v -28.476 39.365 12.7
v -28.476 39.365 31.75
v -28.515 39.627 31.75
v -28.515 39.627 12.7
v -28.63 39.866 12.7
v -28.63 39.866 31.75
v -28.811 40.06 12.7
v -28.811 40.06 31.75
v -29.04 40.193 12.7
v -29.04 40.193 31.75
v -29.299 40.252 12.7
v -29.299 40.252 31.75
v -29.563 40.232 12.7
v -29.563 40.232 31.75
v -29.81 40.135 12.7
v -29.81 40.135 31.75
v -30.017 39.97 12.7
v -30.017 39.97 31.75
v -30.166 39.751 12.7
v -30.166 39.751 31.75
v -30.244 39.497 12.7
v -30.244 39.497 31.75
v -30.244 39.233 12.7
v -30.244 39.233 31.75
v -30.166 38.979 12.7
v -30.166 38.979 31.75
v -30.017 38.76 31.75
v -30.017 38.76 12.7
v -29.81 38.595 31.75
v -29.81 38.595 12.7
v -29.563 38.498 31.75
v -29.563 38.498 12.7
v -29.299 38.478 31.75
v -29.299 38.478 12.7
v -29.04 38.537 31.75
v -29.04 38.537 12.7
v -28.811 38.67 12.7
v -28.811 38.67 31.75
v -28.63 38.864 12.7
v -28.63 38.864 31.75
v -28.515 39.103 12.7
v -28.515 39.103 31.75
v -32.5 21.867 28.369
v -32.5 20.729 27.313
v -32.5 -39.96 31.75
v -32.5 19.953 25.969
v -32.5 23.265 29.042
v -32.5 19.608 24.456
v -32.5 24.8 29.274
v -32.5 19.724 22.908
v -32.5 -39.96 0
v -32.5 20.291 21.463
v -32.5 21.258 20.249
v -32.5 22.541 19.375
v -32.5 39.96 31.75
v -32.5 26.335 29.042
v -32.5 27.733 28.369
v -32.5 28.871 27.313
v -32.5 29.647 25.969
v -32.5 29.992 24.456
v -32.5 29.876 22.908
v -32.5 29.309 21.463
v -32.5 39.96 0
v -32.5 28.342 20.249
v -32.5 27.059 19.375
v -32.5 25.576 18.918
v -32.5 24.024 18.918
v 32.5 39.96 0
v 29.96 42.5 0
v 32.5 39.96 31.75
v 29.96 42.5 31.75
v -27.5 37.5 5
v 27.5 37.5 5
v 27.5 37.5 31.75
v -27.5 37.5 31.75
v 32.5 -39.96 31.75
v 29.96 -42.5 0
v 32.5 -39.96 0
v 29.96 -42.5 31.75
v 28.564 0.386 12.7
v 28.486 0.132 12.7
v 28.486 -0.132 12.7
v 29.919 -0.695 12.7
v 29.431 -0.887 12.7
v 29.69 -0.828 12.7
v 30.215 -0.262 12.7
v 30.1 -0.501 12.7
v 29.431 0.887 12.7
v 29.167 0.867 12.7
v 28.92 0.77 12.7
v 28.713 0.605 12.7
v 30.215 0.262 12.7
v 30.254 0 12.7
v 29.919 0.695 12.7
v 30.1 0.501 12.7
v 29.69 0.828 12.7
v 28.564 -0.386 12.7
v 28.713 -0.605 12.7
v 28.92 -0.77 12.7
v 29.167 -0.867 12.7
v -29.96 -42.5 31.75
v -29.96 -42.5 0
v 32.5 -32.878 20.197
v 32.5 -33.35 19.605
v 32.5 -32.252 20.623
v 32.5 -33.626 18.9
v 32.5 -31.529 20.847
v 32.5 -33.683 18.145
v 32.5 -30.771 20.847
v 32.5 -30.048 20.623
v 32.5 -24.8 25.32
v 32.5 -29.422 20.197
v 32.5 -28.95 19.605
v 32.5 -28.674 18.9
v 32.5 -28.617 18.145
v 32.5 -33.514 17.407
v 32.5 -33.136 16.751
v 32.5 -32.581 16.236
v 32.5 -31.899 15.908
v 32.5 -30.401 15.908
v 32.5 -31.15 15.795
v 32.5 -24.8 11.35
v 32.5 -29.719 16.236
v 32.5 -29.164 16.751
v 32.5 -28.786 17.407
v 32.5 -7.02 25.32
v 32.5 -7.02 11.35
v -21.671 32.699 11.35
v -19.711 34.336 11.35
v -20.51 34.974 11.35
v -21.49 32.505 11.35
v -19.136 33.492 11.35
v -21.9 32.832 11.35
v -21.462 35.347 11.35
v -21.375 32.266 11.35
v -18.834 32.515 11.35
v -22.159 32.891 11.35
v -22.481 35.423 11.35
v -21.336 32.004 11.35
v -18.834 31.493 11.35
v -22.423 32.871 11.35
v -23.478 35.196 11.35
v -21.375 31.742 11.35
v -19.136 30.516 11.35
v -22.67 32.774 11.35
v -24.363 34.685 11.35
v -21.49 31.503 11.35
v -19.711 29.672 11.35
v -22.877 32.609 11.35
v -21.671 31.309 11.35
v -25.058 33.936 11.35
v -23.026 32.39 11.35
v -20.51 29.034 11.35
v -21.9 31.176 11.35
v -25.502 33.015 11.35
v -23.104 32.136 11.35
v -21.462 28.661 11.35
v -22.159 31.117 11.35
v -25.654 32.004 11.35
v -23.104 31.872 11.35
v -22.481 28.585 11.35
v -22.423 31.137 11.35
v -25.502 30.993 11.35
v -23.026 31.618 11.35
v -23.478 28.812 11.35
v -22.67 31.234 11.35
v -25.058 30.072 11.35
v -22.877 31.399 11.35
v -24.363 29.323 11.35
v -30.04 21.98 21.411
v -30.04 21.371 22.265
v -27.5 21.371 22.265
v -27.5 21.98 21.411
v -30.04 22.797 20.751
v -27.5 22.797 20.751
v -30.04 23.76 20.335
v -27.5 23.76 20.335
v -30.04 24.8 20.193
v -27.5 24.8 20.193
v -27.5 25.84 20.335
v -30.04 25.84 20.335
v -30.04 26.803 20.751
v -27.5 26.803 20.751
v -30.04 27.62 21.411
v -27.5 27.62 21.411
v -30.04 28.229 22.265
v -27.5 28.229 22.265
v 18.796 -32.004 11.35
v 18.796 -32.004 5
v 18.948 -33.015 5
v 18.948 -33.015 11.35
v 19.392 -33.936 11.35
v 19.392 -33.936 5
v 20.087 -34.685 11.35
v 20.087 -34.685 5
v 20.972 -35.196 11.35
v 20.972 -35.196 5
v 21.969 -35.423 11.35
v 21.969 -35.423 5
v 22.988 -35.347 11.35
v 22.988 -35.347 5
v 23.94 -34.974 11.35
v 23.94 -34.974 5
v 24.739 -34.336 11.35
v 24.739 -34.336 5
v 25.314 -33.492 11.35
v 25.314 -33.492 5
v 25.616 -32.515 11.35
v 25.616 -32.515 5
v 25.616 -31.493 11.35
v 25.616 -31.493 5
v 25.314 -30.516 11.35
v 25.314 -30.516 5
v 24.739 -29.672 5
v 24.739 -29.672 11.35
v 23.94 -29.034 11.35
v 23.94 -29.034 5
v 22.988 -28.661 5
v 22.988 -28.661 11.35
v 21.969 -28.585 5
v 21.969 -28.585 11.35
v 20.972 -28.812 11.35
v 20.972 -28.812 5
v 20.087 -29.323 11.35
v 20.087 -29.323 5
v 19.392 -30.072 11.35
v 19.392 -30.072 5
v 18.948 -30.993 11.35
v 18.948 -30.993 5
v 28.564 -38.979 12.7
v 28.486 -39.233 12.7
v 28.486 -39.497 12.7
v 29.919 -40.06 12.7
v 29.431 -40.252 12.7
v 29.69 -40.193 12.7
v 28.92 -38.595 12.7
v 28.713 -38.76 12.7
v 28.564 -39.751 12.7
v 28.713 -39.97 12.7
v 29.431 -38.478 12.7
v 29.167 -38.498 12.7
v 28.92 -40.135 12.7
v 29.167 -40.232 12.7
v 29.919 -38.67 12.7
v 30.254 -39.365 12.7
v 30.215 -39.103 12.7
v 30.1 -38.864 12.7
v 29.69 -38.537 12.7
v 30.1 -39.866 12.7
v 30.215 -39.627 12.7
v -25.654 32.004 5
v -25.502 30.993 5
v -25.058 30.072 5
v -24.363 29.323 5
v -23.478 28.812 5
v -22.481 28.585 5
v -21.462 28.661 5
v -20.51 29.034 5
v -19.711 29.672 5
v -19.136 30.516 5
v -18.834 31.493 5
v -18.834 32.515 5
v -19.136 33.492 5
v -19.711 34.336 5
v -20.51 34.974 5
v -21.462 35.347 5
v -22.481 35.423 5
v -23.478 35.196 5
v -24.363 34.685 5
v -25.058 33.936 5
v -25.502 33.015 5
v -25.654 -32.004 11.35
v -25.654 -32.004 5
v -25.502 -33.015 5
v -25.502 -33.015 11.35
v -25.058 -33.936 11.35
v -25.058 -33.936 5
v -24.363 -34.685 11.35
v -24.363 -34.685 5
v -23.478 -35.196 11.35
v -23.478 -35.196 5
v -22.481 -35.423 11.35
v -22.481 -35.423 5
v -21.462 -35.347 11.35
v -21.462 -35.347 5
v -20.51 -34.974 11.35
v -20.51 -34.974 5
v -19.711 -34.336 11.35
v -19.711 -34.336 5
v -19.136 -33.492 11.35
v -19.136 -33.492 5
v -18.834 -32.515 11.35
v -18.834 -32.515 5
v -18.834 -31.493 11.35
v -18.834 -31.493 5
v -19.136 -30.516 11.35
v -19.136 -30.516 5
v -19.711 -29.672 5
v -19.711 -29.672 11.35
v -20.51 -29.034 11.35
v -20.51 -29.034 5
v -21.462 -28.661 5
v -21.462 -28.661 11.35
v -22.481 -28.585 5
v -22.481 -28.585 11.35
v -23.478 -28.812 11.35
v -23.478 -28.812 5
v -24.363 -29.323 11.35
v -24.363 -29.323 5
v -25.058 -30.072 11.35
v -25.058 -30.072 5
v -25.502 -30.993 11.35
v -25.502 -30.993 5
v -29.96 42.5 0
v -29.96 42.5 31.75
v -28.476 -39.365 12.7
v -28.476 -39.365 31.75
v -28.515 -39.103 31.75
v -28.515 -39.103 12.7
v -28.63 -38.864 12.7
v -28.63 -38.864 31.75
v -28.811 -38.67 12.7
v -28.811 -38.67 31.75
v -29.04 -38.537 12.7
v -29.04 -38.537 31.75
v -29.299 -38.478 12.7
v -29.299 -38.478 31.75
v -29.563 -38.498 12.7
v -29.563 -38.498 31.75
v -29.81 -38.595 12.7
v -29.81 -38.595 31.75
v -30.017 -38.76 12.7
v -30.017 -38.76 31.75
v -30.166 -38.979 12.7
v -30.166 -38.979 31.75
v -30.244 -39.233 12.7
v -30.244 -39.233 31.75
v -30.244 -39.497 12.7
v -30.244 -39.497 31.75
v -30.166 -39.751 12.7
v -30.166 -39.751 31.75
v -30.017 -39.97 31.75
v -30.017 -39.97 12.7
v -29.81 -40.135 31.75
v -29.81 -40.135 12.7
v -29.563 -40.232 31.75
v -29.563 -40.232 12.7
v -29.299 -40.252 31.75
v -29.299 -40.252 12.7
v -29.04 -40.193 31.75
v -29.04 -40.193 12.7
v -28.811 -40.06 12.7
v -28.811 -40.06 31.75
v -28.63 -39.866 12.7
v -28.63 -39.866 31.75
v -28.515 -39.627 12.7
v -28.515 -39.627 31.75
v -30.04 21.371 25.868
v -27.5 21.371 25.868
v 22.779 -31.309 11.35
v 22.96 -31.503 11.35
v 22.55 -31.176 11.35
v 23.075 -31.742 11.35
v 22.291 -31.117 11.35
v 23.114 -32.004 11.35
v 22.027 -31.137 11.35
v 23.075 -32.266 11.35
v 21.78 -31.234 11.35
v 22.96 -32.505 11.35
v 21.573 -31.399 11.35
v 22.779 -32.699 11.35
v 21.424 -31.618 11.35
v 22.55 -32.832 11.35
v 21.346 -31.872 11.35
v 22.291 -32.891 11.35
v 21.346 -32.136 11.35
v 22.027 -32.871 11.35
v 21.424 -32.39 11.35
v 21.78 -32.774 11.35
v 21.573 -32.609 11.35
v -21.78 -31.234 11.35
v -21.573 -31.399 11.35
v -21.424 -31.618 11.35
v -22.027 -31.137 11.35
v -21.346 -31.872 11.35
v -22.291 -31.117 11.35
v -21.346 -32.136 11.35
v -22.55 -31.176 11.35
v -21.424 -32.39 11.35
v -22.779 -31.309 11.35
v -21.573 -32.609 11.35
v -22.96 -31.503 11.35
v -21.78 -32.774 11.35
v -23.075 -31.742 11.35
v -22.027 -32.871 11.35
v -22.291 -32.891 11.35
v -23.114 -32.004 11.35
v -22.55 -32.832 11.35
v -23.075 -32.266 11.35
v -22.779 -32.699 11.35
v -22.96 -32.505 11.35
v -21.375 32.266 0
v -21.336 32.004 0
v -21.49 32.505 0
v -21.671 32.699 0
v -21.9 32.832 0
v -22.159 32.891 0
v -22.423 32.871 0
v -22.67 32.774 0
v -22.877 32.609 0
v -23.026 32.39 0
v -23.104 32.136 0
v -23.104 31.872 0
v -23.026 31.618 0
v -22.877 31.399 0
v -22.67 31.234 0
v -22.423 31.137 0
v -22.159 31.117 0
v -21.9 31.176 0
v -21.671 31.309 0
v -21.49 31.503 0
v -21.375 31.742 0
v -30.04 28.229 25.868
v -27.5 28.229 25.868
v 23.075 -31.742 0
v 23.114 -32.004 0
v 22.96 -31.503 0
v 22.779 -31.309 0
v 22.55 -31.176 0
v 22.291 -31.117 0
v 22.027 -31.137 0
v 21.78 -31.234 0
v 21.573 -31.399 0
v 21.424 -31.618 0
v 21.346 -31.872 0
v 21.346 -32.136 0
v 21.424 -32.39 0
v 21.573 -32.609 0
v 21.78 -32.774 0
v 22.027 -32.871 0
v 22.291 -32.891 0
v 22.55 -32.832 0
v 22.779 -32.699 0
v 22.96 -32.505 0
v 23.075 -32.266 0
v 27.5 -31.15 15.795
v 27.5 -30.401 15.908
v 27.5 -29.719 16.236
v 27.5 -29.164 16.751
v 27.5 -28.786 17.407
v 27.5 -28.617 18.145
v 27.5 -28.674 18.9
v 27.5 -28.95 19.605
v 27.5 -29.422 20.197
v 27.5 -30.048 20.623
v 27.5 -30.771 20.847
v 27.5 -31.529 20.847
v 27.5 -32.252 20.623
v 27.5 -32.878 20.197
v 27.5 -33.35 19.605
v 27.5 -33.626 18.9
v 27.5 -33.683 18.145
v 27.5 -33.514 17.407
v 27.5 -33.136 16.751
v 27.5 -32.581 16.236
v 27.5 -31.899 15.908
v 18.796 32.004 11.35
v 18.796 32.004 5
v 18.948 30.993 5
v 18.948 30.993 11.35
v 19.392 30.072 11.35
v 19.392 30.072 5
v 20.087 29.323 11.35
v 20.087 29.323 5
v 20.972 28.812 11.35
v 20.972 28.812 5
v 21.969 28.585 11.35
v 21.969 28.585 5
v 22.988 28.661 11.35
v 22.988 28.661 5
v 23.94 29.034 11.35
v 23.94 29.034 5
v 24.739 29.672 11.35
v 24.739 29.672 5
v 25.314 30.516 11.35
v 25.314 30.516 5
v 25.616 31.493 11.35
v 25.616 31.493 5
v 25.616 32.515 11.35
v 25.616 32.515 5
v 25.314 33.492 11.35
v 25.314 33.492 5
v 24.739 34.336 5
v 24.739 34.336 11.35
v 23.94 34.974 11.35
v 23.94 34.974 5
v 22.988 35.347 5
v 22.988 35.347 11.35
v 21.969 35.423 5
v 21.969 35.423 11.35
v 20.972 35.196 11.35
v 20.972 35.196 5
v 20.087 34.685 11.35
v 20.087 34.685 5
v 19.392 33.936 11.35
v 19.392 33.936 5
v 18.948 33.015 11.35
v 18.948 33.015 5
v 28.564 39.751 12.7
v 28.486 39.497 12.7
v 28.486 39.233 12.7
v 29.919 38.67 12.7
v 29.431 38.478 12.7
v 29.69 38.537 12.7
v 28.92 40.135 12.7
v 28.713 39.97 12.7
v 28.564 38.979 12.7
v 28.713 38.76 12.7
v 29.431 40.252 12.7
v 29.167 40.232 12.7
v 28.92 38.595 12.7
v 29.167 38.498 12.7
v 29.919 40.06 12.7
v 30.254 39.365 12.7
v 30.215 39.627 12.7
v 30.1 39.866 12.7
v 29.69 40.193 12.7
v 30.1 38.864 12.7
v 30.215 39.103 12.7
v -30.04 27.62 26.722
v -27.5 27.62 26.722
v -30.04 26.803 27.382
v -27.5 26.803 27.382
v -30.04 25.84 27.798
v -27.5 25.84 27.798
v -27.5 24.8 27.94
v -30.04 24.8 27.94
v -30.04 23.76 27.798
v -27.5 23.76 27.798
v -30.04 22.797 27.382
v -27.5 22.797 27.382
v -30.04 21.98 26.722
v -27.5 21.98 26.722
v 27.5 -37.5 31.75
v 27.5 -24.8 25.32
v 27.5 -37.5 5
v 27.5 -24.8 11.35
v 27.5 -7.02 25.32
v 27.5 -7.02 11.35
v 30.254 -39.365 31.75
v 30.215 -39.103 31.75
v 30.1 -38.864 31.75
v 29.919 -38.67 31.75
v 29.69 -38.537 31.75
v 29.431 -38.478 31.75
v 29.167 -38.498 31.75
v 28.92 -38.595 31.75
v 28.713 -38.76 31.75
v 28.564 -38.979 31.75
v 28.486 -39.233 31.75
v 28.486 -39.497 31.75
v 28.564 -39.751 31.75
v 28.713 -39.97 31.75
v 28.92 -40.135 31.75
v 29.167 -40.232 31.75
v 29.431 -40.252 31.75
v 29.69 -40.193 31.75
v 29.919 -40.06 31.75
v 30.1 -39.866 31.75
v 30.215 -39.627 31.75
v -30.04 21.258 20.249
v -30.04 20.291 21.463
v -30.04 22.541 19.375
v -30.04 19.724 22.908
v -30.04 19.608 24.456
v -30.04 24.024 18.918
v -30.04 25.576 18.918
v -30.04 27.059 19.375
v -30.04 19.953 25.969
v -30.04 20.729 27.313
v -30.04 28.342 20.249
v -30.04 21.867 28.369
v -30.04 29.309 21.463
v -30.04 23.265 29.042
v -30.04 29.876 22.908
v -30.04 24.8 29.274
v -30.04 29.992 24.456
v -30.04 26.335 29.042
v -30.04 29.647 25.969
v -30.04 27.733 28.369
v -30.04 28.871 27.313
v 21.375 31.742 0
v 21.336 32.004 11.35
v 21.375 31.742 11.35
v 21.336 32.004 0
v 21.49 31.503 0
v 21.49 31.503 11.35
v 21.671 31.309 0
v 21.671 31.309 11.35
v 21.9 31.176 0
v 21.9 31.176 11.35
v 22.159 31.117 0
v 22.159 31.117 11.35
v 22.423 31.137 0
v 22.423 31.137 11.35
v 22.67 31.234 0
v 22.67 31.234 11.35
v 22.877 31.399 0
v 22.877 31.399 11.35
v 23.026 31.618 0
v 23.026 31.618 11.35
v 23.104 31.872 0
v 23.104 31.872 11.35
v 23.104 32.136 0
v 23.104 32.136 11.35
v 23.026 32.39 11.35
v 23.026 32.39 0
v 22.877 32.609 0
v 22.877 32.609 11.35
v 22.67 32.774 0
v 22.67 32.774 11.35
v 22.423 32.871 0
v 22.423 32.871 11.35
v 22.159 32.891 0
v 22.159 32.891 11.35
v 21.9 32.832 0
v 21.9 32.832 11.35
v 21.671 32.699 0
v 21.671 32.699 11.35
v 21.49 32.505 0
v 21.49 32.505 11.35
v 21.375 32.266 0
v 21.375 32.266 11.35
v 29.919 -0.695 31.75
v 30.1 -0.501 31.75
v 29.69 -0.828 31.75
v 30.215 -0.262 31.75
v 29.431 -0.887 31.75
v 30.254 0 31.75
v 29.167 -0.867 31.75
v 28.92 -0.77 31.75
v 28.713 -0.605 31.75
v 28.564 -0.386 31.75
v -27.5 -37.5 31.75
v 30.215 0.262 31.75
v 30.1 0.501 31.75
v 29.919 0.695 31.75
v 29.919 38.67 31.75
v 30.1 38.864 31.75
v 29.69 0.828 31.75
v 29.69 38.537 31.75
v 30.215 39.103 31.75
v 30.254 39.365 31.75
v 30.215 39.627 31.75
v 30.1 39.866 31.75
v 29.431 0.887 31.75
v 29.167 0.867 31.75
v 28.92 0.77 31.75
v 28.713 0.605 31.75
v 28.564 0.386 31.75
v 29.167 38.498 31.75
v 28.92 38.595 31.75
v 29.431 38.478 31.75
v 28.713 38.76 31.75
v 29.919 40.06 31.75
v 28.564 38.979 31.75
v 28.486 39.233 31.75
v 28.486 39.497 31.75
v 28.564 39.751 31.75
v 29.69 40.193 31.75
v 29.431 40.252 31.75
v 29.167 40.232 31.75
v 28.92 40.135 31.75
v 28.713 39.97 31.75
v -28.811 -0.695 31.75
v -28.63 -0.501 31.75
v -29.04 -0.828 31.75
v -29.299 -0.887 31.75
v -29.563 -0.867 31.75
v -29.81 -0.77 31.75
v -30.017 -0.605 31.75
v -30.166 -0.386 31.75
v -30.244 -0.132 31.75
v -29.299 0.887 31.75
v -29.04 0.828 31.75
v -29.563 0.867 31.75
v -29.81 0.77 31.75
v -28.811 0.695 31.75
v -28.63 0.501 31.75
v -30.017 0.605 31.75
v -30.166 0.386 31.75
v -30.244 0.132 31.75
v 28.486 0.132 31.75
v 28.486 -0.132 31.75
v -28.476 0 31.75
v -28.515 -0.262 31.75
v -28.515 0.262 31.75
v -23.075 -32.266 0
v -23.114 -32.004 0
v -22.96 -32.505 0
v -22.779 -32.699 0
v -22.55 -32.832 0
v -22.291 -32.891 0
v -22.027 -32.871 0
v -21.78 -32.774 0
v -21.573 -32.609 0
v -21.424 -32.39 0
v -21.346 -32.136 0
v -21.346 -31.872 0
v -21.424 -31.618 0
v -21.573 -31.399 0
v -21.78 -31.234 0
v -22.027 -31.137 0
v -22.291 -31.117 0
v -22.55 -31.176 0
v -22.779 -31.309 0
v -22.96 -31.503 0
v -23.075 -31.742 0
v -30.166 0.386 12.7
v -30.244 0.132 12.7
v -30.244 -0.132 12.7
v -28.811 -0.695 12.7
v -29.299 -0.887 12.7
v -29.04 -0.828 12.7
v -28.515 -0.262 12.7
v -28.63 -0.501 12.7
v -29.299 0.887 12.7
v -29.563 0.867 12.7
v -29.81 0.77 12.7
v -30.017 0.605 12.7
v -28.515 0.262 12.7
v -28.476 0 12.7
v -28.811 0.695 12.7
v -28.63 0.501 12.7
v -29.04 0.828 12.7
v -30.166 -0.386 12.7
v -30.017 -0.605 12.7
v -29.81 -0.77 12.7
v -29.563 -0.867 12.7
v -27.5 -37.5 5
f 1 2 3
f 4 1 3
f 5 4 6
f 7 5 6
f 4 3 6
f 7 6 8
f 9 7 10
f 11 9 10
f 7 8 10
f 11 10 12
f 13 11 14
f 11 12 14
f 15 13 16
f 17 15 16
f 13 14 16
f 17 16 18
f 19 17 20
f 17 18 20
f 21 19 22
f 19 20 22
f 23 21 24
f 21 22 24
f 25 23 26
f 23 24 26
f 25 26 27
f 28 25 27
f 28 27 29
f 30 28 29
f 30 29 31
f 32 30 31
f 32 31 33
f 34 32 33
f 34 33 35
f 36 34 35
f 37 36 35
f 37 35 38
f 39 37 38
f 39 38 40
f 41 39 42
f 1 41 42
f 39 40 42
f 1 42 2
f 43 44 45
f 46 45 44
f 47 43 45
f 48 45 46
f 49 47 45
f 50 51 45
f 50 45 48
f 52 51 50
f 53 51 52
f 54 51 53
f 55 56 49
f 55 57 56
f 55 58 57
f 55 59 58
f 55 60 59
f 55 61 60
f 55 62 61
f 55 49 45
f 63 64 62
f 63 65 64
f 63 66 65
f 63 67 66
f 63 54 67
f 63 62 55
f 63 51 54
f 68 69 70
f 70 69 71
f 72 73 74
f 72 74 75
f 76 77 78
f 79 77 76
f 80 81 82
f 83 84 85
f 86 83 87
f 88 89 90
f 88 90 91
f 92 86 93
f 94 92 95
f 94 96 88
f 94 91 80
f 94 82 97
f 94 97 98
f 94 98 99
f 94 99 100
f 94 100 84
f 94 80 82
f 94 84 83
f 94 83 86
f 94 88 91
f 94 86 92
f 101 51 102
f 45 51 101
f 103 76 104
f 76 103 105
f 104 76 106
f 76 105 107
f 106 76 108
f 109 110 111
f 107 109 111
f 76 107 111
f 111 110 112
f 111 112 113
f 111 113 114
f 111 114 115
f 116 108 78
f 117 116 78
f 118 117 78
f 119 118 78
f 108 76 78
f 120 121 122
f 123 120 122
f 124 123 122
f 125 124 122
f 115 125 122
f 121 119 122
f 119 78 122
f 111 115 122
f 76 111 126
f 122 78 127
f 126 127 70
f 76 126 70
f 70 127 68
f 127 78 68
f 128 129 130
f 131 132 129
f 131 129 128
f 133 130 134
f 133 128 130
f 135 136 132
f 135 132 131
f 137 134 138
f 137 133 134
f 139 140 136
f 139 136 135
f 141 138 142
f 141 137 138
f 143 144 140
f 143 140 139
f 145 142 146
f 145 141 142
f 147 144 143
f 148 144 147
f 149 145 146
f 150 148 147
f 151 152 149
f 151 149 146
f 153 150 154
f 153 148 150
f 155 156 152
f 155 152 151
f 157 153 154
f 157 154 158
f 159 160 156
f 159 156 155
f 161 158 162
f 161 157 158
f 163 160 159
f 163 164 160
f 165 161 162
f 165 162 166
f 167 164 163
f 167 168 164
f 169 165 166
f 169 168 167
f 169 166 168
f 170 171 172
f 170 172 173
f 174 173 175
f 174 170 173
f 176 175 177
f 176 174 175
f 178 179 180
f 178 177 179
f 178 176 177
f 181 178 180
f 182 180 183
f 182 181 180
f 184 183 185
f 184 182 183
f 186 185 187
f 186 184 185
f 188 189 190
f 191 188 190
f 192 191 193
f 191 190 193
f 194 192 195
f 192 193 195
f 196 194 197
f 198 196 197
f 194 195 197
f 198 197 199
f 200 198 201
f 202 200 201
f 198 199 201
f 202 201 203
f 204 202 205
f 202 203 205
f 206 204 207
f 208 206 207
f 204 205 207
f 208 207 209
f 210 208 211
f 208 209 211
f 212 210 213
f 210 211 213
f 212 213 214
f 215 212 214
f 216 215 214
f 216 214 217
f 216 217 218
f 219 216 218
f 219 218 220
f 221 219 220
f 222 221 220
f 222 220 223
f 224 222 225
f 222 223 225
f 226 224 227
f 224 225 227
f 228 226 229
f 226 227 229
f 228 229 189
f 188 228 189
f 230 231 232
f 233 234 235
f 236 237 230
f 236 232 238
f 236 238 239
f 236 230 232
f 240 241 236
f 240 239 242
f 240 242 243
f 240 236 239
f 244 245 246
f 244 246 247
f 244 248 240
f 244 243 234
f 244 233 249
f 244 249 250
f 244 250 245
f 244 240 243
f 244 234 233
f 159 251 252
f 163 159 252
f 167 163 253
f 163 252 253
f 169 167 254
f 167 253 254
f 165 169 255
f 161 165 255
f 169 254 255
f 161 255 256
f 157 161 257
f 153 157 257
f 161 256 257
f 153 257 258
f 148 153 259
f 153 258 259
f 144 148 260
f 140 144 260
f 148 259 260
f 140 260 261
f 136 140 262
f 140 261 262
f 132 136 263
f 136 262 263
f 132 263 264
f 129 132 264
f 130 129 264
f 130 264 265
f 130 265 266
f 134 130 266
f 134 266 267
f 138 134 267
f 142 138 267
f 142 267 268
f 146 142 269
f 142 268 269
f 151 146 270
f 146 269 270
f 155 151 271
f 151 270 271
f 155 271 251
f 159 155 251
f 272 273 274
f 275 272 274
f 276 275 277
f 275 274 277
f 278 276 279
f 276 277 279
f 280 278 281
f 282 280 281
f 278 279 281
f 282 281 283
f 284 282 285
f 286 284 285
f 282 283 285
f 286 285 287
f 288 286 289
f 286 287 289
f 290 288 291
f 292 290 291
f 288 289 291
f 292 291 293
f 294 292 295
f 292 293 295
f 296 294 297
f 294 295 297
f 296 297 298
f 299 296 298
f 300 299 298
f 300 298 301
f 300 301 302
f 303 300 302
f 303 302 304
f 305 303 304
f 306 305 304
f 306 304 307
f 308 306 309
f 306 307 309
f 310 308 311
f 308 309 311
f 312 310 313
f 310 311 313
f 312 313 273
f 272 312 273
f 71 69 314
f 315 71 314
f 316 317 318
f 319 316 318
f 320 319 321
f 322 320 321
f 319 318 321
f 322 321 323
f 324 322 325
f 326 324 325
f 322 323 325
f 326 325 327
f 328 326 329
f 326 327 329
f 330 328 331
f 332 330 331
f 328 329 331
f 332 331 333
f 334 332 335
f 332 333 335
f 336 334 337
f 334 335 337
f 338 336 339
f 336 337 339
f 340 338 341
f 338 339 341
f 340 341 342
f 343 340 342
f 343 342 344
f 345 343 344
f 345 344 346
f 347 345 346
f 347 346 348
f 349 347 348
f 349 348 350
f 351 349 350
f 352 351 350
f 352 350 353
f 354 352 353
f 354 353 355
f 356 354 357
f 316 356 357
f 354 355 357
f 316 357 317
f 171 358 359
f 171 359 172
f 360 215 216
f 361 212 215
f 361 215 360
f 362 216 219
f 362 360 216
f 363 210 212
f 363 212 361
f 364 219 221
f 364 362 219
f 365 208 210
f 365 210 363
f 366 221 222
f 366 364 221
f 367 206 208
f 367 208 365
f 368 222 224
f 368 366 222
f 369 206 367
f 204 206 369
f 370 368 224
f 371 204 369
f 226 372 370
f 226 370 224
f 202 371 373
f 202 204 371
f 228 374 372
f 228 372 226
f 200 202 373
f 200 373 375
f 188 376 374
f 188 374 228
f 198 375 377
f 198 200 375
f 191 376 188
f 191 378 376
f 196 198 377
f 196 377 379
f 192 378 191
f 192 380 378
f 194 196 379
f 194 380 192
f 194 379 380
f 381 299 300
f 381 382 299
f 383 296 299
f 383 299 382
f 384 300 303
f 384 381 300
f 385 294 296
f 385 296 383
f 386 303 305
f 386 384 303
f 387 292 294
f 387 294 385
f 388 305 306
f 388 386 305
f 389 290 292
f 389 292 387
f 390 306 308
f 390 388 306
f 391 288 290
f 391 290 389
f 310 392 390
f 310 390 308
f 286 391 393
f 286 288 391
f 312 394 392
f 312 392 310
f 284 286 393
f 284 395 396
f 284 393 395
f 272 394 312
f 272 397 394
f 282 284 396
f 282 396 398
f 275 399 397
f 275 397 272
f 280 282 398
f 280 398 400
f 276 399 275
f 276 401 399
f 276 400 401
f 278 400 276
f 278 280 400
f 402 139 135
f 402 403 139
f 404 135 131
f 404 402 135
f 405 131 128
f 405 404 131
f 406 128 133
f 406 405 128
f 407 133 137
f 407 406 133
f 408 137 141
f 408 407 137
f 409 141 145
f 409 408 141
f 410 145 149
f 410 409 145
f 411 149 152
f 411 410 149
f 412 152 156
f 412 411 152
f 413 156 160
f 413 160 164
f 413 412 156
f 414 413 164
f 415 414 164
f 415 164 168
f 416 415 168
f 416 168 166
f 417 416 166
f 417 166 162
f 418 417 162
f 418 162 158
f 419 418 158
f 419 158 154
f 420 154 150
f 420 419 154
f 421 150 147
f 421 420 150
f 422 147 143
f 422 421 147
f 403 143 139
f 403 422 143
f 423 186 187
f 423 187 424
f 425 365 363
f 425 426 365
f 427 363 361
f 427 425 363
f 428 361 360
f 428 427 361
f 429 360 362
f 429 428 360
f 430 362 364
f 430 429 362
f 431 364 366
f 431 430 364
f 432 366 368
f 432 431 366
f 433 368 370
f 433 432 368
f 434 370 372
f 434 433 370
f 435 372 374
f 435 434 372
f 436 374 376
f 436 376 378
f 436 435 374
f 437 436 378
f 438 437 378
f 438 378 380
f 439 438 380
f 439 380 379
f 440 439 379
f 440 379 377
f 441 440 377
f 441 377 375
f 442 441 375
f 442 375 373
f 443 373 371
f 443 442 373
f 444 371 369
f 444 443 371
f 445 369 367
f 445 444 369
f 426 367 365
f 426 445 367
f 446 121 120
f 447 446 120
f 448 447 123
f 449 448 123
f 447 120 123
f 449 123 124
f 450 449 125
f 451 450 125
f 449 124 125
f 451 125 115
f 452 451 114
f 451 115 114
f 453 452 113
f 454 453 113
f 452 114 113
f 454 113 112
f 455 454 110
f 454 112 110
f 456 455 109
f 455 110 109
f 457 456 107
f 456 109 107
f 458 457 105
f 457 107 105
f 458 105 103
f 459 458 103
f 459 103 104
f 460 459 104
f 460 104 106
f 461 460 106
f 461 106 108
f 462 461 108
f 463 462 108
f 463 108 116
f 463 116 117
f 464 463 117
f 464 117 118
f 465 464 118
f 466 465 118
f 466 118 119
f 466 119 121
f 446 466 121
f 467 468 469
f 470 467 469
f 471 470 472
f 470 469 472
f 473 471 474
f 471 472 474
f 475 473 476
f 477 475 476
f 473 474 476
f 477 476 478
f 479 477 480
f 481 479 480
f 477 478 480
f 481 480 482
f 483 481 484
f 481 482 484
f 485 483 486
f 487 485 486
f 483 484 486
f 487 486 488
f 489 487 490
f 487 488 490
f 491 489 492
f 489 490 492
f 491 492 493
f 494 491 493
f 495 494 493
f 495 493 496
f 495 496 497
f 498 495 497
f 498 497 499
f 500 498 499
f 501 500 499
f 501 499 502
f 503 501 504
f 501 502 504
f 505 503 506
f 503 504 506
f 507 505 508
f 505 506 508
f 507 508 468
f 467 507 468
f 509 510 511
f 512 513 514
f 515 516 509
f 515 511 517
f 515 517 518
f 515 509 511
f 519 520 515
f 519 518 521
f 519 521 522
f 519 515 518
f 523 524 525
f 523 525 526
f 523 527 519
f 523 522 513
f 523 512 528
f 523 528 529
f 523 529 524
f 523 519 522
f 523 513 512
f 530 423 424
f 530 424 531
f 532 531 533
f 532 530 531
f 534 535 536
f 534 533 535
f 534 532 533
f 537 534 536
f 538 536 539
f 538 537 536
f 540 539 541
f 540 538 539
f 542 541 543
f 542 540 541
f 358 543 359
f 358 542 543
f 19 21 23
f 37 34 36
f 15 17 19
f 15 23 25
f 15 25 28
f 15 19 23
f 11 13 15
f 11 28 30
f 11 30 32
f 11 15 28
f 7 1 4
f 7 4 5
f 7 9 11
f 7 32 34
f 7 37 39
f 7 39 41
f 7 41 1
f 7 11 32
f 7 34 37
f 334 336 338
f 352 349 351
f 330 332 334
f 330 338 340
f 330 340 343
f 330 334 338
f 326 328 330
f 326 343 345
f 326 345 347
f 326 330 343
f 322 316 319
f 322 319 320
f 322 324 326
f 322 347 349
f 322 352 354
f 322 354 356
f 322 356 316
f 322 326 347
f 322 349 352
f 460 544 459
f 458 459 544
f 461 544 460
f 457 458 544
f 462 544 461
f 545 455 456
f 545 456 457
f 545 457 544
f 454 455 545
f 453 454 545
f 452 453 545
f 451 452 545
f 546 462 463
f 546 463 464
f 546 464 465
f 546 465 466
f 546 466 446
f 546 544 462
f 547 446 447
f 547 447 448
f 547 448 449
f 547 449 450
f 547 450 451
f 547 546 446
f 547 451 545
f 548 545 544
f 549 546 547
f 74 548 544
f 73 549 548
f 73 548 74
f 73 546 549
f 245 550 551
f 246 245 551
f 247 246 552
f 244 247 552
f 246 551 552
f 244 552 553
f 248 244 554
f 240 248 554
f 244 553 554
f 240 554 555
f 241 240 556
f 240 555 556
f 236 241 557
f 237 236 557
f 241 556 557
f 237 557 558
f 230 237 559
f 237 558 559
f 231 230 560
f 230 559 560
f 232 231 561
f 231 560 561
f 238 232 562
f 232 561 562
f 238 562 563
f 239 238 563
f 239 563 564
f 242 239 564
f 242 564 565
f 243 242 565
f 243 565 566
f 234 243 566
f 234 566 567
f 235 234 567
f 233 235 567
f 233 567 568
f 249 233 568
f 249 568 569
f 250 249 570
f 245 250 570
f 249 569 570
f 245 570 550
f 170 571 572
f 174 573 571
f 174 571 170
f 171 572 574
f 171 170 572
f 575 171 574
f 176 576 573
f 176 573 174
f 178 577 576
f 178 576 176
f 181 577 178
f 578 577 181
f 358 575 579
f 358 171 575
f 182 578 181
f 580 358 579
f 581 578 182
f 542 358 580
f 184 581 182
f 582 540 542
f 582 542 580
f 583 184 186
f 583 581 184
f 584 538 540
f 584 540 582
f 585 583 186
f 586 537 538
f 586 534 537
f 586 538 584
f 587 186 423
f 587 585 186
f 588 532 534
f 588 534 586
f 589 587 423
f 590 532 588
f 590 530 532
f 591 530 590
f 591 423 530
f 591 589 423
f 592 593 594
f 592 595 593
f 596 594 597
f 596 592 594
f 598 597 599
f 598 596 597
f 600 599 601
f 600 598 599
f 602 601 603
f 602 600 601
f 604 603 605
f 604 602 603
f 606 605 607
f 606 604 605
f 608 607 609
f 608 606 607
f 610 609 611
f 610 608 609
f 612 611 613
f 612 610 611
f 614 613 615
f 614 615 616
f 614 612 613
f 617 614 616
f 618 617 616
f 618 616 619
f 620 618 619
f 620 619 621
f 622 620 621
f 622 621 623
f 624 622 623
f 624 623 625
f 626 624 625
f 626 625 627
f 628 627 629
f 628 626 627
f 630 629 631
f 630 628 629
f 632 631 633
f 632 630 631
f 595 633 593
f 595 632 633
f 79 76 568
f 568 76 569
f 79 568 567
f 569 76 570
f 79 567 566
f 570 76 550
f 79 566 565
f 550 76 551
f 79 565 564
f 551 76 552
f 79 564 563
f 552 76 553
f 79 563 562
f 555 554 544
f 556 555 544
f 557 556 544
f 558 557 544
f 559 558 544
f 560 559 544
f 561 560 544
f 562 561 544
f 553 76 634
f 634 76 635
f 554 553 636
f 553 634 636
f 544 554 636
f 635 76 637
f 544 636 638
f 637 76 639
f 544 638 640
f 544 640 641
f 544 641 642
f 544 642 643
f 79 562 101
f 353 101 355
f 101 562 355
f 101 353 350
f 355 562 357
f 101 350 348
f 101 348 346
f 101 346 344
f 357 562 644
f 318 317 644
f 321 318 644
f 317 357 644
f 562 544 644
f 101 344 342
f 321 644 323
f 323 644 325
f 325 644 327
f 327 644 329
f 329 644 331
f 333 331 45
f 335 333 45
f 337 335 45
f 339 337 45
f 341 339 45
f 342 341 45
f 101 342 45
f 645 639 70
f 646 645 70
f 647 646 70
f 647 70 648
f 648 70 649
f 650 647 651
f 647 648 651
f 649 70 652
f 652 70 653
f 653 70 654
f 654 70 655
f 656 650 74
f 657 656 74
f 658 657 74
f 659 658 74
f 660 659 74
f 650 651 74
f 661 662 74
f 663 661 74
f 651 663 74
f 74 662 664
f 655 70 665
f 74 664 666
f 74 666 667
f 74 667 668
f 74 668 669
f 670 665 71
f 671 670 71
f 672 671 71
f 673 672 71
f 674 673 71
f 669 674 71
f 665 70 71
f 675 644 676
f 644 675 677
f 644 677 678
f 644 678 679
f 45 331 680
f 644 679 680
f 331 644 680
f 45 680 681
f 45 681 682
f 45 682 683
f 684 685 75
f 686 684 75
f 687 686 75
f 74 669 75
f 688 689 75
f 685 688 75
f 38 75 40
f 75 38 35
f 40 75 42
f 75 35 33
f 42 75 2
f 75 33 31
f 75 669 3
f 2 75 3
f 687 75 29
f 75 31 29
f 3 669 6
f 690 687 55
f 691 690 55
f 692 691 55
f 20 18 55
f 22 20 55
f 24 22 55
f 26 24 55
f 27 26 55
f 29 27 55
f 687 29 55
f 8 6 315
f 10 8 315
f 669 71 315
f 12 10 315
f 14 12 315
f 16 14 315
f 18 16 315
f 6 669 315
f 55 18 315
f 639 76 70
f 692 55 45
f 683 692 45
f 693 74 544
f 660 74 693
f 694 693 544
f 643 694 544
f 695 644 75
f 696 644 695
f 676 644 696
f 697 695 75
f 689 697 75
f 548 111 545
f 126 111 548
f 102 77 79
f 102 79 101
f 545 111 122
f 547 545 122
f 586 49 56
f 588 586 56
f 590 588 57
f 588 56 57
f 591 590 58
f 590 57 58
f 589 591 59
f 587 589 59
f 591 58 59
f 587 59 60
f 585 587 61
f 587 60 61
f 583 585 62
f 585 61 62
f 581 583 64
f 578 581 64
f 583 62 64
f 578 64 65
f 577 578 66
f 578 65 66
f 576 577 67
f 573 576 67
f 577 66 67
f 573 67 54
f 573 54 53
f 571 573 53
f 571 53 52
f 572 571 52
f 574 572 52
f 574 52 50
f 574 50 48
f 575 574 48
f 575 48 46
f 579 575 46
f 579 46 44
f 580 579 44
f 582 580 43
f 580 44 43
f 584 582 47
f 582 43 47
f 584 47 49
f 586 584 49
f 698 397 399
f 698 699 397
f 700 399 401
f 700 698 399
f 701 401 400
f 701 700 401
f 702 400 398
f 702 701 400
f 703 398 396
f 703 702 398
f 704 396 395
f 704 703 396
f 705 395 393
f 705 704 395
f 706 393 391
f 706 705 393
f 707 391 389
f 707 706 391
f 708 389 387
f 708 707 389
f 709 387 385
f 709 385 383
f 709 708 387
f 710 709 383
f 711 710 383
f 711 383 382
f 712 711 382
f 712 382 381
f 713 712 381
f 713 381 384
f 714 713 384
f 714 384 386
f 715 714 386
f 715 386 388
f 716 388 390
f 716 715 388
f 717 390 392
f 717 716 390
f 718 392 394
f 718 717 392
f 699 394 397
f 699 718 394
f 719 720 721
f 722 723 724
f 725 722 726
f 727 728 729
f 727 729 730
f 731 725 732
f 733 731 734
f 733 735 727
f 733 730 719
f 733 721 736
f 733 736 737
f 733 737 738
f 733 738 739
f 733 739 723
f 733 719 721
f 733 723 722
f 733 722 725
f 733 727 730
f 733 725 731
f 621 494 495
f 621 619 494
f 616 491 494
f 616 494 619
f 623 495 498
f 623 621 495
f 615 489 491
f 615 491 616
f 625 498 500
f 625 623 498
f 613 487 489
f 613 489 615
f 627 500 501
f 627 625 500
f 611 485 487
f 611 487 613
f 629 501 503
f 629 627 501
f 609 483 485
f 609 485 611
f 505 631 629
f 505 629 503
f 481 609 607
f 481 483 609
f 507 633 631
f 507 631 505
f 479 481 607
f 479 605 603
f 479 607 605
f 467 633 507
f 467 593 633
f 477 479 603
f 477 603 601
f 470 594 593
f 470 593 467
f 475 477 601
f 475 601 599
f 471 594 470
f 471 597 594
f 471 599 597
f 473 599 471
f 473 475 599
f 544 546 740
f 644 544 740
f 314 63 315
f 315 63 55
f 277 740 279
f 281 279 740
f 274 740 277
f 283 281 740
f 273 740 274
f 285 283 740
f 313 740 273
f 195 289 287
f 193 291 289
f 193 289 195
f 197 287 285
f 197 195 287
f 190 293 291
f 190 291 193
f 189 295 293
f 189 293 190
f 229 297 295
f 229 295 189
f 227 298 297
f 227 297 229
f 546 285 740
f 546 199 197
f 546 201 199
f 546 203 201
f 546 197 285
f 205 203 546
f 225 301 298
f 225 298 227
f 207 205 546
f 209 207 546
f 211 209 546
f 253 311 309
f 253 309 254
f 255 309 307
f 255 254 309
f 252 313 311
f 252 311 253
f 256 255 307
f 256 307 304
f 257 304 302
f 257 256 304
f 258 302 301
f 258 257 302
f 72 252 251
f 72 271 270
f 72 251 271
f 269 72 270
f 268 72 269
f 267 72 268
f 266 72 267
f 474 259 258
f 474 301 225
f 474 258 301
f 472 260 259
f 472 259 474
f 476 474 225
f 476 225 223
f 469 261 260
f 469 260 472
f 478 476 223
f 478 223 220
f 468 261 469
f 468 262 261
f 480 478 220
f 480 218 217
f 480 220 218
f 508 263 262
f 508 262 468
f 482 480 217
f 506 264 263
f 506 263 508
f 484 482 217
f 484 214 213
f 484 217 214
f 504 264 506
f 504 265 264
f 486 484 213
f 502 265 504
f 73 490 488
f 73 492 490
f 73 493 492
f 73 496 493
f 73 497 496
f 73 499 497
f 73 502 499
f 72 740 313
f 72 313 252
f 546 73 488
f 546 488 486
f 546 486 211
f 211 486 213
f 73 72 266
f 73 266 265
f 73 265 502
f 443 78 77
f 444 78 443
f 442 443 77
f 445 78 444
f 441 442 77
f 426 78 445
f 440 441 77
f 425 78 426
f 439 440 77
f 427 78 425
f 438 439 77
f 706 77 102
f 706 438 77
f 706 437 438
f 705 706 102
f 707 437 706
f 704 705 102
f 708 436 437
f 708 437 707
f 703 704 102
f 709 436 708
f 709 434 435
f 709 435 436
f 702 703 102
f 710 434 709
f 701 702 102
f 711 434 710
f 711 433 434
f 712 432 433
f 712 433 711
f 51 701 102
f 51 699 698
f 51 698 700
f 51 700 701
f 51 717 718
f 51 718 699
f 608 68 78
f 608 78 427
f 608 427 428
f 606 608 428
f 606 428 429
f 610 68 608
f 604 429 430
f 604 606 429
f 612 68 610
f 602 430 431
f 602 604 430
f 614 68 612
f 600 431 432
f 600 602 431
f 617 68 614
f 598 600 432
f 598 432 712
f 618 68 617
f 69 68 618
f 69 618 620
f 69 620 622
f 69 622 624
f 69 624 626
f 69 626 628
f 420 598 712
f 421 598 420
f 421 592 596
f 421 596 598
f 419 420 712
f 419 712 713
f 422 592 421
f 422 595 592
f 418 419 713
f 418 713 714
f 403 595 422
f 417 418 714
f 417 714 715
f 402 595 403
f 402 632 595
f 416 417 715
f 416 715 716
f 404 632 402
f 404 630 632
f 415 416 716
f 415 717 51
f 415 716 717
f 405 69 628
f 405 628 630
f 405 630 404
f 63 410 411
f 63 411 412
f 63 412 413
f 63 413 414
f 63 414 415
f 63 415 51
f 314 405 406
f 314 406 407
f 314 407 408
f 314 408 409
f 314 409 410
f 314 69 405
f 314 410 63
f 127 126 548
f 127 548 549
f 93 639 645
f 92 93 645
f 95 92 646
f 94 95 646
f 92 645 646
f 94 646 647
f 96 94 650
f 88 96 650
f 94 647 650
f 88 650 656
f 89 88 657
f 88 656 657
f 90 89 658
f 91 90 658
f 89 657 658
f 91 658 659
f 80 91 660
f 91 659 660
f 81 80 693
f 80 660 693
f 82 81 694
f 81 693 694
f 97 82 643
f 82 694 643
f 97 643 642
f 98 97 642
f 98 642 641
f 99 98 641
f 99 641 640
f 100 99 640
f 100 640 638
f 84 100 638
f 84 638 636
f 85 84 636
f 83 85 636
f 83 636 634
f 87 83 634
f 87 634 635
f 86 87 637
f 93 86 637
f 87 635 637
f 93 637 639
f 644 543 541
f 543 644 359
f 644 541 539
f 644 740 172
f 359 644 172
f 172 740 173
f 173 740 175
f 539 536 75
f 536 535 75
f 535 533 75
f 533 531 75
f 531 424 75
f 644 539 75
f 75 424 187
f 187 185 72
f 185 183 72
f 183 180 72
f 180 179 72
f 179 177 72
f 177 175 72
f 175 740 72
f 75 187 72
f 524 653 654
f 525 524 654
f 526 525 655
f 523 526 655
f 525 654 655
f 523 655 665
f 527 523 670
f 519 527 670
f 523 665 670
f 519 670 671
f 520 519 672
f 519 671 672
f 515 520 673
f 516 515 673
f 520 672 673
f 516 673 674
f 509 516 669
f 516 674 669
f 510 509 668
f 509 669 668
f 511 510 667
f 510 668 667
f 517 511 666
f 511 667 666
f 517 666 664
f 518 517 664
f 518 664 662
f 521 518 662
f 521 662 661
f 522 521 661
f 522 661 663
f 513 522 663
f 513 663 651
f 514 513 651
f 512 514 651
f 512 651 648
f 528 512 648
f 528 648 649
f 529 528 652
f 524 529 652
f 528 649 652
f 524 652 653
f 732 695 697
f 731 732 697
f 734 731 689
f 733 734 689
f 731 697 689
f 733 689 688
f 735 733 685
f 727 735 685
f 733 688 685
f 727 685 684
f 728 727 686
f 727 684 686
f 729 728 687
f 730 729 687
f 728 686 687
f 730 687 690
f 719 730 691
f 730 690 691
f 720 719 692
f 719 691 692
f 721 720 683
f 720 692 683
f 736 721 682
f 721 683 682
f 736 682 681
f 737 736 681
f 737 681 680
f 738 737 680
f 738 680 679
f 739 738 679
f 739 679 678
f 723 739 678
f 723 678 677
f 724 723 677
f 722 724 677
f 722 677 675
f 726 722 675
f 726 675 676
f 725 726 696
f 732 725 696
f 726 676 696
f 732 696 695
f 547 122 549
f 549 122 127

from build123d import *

# Parameters (mm, degrees)
SKETCH1_W           = 55
SKETCH1_H           = 75
SKETCH1_R           = 0.889
BOSS_EXTRUDE1_DEPTH = 5
SKETCH2_W           = 65
SKETCH2_H           = 85
SKETCH2_W_2         = 55
SKETCH2_H_2         = 75
BOSS_EXTRUDE2_DEPTH = 31.75
CUT_EXTRUDE1_REACH  = 85.901
SKETCH4_R           = 5.207
CUT_EXTRUDE2_DEPTH  = 2.46
CHAMFER1_SIZE       = 2.54
SKETCH5_R           = 0.889
CUT_EXTRUDE3_DEPTH  = 19.05
SKETCH6_R           = 3.429
SKETCH6_R_2         = 0.889
BOSS_EXTRUDE3_DEPTH = 6.35
CUT_EXTRUDE4_REACH  = 85.901
SKETCH7_W           = 13.97
SKETCH7_H           = 17.78
CUT_EXTRUDE5_REACH  = 85.901
SKETCH8_R           = 2.54


with BuildPart() as part:
    # Sketch1 → Boss-Extrude1 (new body)
    with BuildSketch(Plane.XY):
        Rectangle(SKETCH1_W, SKETCH1_H)
        with Locations((-22.225, 32.004)):
            Circle(SKETCH1_R, mode=Mode.SUBTRACT)
        with Locations(Location((-22.225, -32.004, 0), (0, 0, 180))):
            Circle(SKETCH1_R, mode=Mode.SUBTRACT)
        with Locations((22.225, -32.004)):
            Circle(SKETCH1_R, mode=Mode.SUBTRACT)
        with Locations(Location((22.225, 32.004, 0), (0, 0, 180))):
            Circle(SKETCH1_R, mode=Mode.SUBTRACT)
    extrude(amount=BOSS_EXTRUDE1_DEPTH)

    # Sketch2 → Boss-Extrude2 (add)
    with BuildSketch(Plane(origin=(0, 0, 0), x_dir=(-1, 0, 0), z_dir=(0, 0, -1))):
        Rectangle(SKETCH2_W, SKETCH2_H)
        Rectangle(SKETCH2_W_2, SKETCH2_H_2, mode=Mode.SUBTRACT)
    extrude(amount=-BOSS_EXTRUDE2_DEPTH)

    # Sketch3 → Cut-Extrude1 (cut, up to next)
    with BuildSketch(Plane.ZY.offset(32.5), mode=Mode.PRIVATE) as cut_extrude1_sk1:
        with BuildLine():
            Line((25.868155142, 21.371), (22.264844858, 21.371))
            ThreePointArc((22.264844858, 21.371), (20.193, 24.8), (22.264844858, 28.229))
            Line((22.264844858, 28.229), (25.868155142, 28.229))
            ThreePointArc((25.868155142, 28.229), (27.94, 24.8), (25.868155142, 21.371))
        make_face()
    cut_extrude1_tool1 = extrude(cut_extrude1_sk1.sketch, amount=-CUT_EXTRUDE1_REACH, mode=Mode.PRIVATE) & part.part
    add(cut_extrude1_tool1.solids().sort_by_distance((-32.5, 24.8, 24.0665))[0], mode=Mode.SUBTRACT)

    # Sketch4 → Cut-Extrude2 (cut)
    with BuildSketch(Plane.ZY.offset(32.5)):
        with Locations((24.0665, 24.8)):
            Circle(SKETCH4_R)
    extrude(amount=-CUT_EXTRUDE2_DEPTH, mode=Mode.SUBTRACT)

    # Chamfer1
    chamfer1_edges = [part.edges().sort_by_distance(p)[0] for p in [
        (32.5, 42.5, 15.875),
        (-32.5, 42.5, 15.875),
        (-32.5, -42.5, 15.875),
        (32.5, -42.5, 15.875),
    ]]
    chamfer(chamfer1_edges, length=CHAMFER1_SIZE)

    # Sketch5 → Cut-Extrude3 (cut)
    with BuildSketch(Plane.XY.offset(31.75)):
        with Locations((29.365, 39.365)):
            Circle(SKETCH5_R)
        with Locations((29.365, -39.365)):
            Circle(SKETCH5_R)
        with Locations((-29.365, -39.365)):
            Circle(SKETCH5_R)
        with Locations((-29.365, 39.365)):
            Circle(SKETCH5_R)
        with Locations((29.365, 0)):
            Circle(SKETCH5_R)
        with Locations((-29.365, 0)):
            Circle(SKETCH5_R)
    extrude(amount=-CUT_EXTRUDE3_DEPTH, mode=Mode.SUBTRACT)

    # Sketch6 → Boss-Extrude3 (add)
    # profile 1 of 4: a face of its own
    with BuildSketch(Plane.XY.offset(5)):
        with Locations(Location((-22.225, 32.004, 0), (0, 0, 180))):
            Circle(SKETCH6_R)
        with Locations((-22.225, 32.004)):
            Circle(SKETCH6_R_2, mode=Mode.SUBTRACT)
    # profile 2 of 4: a face of its own
    with BuildSketch(Plane.XY.offset(5)):
        with Locations(Location((-22.225, -32.004, 0), (0, 0, 180))):
            Circle(SKETCH6_R)
        with Locations(Location((-22.225, -32.004, 0), (0, 0, 180))):
            Circle(SKETCH6_R_2, mode=Mode.SUBTRACT)
    # profile 3 of 4: a face of its own
    with BuildSketch(Plane.XY.offset(5)):
        with Locations(Location((22.225, -32.004, 0), (0, 0, 180))):
            Circle(SKETCH6_R)
        with Locations((22.225, -32.004)):
            Circle(SKETCH6_R_2, mode=Mode.SUBTRACT)
    # profile 4 of 4: a face of its own
    with BuildSketch(Plane.XY.offset(5)):
        with Locations(Location((22.225, 32.004, 0), (0, 0, 180))):
            Circle(SKETCH6_R)
        with Locations(Location((22.225, 32.004, 0), (0, 0, 180))):
            Circle(SKETCH6_R_2, mode=Mode.SUBTRACT)
    extrude(amount=BOSS_EXTRUDE3_DEPTH)

    # Sketch7 → Cut-Extrude4 (cut, up to next)
    with BuildSketch(Plane(origin=(32.5, 0, 0), x_dir=(0, 0, -1), z_dir=(1, 0, 0)), mode=Mode.PRIVATE) as cut_extrude4_sk1:
        with Locations((-18.335, -15.91)):
            Rectangle(SKETCH7_W, SKETCH7_H)
    cut_extrude4_tool1 = extrude(cut_extrude4_sk1.sketch, amount=-CUT_EXTRUDE4_REACH, mode=Mode.PRIVATE) & part.part
    add(cut_extrude4_tool1.solids().sort_by_distance((32.5, -15.91, 18.335))[0], mode=Mode.SUBTRACT)

    # Sketch8 → Cut-Extrude5 (cut, up to next)
    with BuildSketch(Plane(origin=(32.5, 0, 0), x_dir=(0, 0, -1), z_dir=(1, 0, 0)), mode=Mode.PRIVATE) as cut_extrude5_sk1:
        with Locations((-18.335, -31.15)):
            Circle(SKETCH8_R)
    cut_extrude5_tool1 = extrude(cut_extrude5_sk1.sketch, amount=-CUT_EXTRUDE5_REACH, mode=Mode.PRIVATE) & part.part
    add(cut_extrude5_tool1.solids().sort_by_distance((32.5, -31.15, 18.335))[0], mode=Mode.SUBTRACT)


solid = part.part
